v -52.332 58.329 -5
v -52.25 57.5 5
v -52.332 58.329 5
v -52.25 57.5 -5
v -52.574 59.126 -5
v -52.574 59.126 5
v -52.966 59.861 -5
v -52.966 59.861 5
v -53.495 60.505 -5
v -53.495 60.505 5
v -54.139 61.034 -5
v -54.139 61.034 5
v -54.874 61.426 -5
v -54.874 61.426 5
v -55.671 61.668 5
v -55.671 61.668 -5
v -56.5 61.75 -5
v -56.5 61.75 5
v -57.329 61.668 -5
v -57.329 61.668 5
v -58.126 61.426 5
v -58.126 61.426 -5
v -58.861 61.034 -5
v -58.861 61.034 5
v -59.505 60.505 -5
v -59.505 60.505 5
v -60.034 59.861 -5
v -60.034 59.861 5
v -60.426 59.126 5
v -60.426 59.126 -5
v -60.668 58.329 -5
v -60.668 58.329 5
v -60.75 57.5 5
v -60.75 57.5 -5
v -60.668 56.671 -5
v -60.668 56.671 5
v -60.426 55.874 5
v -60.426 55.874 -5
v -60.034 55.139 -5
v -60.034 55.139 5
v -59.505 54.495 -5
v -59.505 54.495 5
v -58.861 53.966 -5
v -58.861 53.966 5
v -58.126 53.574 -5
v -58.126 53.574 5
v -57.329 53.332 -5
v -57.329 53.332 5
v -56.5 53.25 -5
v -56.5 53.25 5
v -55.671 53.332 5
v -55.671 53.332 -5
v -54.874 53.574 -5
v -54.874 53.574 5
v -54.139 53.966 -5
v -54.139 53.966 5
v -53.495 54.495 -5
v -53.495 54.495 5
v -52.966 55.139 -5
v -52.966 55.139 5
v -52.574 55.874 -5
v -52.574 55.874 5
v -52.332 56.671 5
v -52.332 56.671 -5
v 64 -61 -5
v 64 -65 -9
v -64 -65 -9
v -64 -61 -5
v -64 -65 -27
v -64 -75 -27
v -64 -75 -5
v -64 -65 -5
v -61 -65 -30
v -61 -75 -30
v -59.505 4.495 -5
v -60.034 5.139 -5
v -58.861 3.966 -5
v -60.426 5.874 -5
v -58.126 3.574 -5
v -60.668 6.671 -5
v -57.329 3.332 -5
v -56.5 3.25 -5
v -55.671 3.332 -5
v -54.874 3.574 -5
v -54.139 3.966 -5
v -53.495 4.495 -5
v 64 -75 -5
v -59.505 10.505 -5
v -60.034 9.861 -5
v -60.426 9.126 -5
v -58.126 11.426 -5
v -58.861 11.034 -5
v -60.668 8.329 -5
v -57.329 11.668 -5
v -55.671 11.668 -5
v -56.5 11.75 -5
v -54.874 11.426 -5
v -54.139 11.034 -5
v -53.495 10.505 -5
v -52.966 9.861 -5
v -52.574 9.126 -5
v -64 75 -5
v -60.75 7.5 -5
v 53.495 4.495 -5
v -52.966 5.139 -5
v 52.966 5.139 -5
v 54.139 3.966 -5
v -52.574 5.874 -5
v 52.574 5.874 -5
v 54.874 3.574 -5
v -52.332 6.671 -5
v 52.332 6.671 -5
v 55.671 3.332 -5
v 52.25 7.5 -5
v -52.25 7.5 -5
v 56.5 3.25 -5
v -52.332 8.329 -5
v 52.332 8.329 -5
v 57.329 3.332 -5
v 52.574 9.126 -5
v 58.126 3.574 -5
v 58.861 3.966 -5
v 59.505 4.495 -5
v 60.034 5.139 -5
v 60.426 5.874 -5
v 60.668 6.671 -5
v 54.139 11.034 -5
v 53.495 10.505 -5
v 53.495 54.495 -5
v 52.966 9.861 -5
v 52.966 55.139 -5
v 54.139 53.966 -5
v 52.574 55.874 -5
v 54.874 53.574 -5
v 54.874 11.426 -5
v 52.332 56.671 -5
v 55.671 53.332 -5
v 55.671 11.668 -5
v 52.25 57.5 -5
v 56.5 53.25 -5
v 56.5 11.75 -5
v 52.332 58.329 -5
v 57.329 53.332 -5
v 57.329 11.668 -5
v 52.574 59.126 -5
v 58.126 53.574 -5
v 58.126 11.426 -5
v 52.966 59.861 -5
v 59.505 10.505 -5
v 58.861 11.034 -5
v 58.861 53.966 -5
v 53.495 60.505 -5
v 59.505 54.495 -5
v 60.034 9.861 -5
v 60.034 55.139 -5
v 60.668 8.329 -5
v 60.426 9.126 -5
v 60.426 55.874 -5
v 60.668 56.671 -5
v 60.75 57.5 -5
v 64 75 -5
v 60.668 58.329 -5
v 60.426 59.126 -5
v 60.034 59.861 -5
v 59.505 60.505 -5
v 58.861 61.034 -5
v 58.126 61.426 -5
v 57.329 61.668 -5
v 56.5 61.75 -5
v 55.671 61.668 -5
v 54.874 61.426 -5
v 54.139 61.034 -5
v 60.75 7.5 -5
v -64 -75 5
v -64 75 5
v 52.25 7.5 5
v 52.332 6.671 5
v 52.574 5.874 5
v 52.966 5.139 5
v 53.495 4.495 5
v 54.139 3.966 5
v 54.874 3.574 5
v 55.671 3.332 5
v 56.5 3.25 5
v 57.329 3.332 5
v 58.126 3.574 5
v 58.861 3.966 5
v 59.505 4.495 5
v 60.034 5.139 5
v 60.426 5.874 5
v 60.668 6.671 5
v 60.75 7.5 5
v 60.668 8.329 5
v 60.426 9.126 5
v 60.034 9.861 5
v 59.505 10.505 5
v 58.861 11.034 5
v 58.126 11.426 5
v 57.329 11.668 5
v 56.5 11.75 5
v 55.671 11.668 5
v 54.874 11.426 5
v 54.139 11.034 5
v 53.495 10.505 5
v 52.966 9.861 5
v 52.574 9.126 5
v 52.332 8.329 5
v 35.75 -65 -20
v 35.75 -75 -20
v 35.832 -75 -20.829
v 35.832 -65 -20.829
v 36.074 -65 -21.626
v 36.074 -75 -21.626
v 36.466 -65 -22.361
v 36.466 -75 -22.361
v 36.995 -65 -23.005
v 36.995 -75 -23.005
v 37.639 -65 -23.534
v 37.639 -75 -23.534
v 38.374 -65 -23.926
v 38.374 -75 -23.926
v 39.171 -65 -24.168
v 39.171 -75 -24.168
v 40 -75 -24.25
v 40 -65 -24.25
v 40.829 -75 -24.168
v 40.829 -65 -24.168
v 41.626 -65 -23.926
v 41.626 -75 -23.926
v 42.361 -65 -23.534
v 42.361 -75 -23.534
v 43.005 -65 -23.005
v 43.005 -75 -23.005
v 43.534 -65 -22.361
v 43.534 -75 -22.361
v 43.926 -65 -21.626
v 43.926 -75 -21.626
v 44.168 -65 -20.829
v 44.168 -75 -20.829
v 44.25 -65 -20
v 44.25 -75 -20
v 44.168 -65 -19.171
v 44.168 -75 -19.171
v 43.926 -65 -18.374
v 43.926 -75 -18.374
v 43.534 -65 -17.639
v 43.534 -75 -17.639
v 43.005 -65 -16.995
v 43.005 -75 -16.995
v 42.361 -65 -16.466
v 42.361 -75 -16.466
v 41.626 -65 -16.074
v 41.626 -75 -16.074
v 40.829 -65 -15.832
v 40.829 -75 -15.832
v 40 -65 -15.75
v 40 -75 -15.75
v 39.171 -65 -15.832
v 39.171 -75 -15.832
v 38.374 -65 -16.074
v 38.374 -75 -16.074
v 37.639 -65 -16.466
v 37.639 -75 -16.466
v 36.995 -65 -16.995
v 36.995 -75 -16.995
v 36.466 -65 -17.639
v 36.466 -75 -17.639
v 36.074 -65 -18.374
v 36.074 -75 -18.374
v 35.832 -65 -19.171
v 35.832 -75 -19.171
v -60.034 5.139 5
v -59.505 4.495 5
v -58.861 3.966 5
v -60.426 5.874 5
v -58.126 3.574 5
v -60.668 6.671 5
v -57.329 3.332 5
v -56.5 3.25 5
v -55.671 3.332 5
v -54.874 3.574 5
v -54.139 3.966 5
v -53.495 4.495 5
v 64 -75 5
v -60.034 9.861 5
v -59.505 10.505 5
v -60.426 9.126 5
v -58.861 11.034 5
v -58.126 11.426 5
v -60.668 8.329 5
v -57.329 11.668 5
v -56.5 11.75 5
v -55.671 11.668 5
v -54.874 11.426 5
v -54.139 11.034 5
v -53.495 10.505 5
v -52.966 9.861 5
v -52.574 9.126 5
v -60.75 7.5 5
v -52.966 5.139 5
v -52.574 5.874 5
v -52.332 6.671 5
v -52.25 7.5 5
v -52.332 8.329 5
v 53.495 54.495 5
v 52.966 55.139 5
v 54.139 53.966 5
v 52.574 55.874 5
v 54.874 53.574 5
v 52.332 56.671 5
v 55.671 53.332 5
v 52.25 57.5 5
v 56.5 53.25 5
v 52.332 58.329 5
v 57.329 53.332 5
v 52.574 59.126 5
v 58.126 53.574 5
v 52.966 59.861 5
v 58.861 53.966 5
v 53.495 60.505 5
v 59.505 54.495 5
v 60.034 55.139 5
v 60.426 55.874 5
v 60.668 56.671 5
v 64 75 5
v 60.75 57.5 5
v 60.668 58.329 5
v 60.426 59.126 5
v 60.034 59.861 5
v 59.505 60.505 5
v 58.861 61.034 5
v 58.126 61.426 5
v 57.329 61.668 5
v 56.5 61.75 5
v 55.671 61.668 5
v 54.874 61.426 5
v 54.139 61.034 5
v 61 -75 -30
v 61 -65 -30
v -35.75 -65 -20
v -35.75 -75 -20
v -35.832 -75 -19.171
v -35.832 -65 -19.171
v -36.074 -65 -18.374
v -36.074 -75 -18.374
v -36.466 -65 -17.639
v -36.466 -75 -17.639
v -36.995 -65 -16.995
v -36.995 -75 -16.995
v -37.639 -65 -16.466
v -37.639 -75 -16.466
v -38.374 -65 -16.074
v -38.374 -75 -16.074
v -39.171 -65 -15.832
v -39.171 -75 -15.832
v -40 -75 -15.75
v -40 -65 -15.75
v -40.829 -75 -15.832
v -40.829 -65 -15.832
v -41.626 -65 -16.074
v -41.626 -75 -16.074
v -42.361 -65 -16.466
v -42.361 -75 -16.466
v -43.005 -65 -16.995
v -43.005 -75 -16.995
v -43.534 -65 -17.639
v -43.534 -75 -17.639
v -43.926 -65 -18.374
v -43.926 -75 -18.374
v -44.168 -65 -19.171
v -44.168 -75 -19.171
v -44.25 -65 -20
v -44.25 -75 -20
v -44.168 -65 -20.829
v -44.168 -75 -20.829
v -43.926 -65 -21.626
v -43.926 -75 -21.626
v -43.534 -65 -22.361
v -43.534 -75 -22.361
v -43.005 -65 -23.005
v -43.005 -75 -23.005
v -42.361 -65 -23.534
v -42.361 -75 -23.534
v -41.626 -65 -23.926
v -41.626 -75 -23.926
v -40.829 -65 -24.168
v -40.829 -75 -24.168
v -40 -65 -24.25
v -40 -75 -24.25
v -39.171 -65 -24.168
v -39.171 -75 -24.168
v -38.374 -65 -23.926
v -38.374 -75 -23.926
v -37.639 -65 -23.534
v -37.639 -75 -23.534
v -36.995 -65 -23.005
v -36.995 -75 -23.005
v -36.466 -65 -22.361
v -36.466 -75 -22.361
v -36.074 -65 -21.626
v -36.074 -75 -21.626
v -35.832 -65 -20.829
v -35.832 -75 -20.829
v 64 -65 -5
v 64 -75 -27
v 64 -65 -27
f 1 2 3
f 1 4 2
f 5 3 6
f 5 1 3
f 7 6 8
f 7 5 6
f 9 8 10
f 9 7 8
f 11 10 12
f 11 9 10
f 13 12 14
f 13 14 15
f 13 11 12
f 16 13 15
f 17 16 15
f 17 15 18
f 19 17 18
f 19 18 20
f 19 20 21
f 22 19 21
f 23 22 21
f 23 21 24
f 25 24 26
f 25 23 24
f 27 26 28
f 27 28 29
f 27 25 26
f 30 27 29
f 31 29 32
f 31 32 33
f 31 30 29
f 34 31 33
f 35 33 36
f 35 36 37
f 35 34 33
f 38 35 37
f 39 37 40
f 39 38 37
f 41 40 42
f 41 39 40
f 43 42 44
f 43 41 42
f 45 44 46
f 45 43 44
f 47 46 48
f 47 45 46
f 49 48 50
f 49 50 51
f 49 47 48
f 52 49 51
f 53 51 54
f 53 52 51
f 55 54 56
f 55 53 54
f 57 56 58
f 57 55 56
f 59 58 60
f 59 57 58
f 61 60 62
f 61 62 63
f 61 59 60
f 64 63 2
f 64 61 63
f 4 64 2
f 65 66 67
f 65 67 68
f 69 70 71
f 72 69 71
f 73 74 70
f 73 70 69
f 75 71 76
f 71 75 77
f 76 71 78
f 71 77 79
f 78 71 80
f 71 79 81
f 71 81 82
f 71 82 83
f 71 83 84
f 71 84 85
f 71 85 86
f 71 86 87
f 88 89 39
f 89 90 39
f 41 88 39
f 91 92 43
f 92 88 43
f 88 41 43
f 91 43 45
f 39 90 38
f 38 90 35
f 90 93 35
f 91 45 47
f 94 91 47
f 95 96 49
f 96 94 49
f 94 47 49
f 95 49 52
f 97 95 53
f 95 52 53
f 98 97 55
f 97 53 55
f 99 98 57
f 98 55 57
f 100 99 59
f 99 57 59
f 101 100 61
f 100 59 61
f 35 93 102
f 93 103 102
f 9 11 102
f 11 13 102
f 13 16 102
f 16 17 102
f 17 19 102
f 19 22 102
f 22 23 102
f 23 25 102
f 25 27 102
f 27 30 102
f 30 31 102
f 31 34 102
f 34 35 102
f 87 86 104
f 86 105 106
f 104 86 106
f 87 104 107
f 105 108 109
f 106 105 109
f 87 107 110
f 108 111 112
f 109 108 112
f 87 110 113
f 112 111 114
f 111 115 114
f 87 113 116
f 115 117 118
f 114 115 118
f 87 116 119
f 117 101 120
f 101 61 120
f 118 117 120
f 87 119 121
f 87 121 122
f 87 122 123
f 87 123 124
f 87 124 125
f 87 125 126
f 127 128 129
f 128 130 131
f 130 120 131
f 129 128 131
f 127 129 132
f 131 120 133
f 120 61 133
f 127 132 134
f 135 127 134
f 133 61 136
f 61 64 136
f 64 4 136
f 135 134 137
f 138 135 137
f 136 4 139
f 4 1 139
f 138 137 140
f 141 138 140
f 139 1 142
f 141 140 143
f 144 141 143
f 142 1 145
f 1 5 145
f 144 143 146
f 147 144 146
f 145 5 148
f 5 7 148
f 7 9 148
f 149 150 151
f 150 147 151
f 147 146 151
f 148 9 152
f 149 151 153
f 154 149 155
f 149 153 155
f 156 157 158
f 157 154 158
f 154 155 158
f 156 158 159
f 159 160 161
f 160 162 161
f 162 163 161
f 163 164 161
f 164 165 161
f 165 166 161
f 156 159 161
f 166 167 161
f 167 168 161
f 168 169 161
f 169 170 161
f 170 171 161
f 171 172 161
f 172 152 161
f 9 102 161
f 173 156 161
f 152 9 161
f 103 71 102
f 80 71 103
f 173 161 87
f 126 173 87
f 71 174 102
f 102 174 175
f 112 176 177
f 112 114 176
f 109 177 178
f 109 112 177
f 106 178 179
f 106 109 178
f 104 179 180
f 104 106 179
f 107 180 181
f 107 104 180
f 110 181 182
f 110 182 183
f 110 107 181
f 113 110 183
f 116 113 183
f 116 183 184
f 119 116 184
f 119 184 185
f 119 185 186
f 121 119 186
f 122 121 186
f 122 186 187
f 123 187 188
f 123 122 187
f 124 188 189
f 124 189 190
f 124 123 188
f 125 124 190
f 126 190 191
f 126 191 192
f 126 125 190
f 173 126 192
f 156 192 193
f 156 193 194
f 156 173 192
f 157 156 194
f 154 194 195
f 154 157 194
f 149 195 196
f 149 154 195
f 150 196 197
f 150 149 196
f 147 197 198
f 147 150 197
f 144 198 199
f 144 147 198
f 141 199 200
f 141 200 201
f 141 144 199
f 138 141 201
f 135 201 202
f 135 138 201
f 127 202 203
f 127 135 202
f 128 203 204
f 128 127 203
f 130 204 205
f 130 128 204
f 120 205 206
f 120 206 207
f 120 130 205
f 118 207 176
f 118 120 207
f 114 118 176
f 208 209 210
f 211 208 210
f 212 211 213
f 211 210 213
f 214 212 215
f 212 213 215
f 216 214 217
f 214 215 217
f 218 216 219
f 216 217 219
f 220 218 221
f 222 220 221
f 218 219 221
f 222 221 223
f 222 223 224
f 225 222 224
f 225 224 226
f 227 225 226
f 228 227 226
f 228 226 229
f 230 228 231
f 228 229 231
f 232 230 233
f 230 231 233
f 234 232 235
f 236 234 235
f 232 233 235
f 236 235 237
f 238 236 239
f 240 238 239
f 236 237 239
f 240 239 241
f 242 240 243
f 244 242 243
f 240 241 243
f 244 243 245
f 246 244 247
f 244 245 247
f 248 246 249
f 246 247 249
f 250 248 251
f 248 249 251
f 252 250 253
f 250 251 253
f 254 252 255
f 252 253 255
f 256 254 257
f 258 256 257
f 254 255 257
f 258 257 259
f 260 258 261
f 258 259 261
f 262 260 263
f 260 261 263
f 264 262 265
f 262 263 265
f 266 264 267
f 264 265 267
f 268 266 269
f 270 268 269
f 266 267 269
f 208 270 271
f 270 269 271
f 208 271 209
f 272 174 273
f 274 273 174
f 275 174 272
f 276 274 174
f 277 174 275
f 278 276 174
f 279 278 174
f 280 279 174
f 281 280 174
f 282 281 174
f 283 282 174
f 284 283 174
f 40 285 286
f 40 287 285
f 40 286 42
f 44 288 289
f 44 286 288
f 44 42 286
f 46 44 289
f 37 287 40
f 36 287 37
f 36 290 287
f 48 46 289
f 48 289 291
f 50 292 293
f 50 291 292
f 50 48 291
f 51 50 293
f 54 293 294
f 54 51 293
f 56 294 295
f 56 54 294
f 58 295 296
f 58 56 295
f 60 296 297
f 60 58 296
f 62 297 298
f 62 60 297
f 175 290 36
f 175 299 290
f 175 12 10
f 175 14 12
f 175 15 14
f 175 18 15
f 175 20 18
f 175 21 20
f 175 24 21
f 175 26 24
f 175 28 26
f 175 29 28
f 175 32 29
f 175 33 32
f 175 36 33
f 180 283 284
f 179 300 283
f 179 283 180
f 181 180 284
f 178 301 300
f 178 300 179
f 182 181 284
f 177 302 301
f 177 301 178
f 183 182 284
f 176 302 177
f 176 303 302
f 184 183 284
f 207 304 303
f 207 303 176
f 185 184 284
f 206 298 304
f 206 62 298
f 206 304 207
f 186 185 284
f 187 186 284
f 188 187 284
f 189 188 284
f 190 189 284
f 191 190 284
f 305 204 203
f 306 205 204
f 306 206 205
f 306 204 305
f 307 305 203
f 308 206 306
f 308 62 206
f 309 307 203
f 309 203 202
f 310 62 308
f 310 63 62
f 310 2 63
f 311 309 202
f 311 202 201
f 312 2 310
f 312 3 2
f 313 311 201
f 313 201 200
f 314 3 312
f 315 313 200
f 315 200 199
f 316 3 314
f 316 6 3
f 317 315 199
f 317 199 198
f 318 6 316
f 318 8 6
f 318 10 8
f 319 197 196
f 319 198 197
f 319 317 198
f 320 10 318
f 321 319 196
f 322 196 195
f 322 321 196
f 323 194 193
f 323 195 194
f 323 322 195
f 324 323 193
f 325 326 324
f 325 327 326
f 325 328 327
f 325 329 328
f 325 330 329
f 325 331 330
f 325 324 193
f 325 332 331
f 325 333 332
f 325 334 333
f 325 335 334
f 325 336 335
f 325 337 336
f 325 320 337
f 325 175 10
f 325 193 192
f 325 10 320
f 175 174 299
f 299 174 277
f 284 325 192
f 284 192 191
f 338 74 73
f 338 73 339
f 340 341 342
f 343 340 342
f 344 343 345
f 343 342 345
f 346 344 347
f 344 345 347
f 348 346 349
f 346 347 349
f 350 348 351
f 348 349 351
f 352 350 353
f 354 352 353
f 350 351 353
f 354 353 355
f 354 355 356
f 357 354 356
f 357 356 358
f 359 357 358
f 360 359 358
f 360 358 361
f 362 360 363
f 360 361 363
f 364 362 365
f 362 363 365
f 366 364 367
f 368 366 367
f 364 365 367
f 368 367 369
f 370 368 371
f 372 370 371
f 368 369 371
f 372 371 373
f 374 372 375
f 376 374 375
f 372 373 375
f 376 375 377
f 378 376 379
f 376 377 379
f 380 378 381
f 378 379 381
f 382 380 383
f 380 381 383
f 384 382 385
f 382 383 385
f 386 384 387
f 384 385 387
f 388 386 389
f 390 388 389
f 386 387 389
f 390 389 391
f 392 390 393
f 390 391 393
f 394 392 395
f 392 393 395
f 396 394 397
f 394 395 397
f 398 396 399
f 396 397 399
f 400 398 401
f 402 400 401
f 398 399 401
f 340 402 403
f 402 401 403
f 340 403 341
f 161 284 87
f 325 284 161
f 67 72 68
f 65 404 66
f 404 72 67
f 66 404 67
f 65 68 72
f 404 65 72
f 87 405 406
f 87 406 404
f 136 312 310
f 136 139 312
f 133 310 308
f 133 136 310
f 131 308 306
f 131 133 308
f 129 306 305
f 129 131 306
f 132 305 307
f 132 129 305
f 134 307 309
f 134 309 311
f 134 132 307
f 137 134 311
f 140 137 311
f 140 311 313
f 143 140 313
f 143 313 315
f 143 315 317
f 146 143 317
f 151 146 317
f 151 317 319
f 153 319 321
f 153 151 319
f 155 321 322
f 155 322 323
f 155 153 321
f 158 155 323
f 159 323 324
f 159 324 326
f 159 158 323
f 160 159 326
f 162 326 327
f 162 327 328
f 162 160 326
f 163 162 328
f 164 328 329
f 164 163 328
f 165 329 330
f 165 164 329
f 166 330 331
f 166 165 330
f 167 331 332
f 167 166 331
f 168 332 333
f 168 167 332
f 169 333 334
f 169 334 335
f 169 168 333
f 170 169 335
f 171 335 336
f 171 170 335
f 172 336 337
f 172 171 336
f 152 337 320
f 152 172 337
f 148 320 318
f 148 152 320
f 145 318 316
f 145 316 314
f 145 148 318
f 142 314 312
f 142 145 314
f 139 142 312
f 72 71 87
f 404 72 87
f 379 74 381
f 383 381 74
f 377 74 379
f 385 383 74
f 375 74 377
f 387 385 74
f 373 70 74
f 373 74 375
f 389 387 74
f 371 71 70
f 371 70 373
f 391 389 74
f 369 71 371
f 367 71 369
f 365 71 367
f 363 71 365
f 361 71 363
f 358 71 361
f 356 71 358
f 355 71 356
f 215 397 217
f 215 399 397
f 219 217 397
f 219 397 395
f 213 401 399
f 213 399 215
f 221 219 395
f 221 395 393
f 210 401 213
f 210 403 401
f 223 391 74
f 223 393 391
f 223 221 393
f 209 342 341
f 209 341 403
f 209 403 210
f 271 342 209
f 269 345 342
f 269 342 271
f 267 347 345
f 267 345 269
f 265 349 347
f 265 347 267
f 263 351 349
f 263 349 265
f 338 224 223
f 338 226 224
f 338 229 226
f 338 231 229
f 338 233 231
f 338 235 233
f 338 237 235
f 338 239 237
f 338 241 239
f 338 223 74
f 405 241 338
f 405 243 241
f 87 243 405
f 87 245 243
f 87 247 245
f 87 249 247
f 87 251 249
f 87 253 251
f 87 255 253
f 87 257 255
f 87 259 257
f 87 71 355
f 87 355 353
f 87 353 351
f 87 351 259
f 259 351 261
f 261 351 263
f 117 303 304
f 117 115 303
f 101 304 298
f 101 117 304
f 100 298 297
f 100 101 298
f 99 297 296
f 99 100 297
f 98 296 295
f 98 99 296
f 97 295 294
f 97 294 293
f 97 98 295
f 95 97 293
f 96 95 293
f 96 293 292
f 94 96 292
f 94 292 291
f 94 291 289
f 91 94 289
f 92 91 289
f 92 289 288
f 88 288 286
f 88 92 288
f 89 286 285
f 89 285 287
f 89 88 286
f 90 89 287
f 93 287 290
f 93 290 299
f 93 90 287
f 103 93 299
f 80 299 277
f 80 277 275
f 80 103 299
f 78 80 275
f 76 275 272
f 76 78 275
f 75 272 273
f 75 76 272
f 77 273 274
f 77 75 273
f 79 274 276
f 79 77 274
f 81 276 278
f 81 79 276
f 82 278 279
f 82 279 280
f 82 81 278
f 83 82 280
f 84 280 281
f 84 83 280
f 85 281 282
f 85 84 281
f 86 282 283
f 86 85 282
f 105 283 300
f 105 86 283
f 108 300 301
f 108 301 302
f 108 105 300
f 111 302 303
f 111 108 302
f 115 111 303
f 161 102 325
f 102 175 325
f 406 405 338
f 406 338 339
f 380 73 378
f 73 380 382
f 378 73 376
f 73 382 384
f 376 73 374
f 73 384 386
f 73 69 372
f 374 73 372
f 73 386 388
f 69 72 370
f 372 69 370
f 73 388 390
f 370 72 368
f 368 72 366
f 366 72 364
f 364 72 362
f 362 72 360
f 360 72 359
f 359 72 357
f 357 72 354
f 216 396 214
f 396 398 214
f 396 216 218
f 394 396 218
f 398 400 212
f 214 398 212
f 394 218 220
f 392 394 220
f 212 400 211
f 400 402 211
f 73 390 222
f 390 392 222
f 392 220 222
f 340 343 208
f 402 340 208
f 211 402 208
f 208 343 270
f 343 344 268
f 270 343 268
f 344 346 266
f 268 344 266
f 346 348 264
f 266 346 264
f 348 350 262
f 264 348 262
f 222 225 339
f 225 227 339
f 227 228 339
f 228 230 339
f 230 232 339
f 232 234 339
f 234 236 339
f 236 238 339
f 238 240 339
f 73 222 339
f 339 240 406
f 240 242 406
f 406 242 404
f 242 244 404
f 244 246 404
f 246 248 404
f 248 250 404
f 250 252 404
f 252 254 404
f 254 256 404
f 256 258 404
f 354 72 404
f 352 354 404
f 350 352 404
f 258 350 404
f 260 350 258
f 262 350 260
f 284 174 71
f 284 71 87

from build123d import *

# Parameters (mm, degrees)
SKETCH1_W           = 128
SKETCH1_H           = 150
SKETCH1_R           = 4.25
BOSS_EXTRUDE1_DEPTH = 5
SKETCH2_W           = 128
SKETCH2_H           = 25
SKETCH2_R           = 4.25
BOSS_EXTRUDE2_DEPTH = 10
FILLET_START        = -64
FILLET_BEAD1_DEPTH  = 128
CHAMFER1_SIZE       = 3


# Read off the part's stored shape, not the designer's step: Fillet Bead1
with BuildPart() as part:
    # Sketch1 → Boss-Extrude1 (new, symmetric)
    with BuildSketch(Plane.XY):
        Rectangle(SKETCH1_W, SKETCH1_H)
        with Locations((-56.5, 57.5)):
            Circle(SKETCH1_R, mode=Mode.SUBTRACT)
        with Locations((-56.5, 7.5)):
            Circle(SKETCH1_R, mode=Mode.SUBTRACT)
        with Locations(Location((56.5, 7.5, 0), (0, 0, 180))):
            Circle(SKETCH1_R, mode=Mode.SUBTRACT)
        with Locations(Location((56.5, 57.5, 0), (0, 0, 180))):
            Circle(SKETCH1_R, mode=Mode.SUBTRACT)
    extrude(amount=BOSS_EXTRUDE1_DEPTH, both=True)


with BuildPart() as body_2:
    # Sketch2 → Boss-Extrude2 (new body)
    with BuildSketch(Plane.XZ.offset(75)):
        with Locations((0, -17.5)):
            Rectangle(SKETCH2_W, SKETCH2_H)
        with Locations((-40, -20)):
            Circle(SKETCH2_R, mode=Mode.SUBTRACT)
        with Locations(Location((40, -20, 0), (0, 0, 180))):
            Circle(SKETCH2_R, mode=Mode.SUBTRACT)
    extrude(amount=-BOSS_EXTRUDE2_DEPTH)

    # Chamfer1
    chamfer1_edges = [body_2.edges().sort_by_distance(p)[0] for p in [
        (64, -70, -30),
        (-64, -70, -30),
    ]]
    chamfer(chamfer1_edges, length=CHAMFER1_SIZE)


with BuildPart() as body_3:
    # Fillet Bead1 outline → Fillet Bead1 (new body)
    with BuildSketch(Plane.YZ.offset(FILLET_START)):
        Polygon((-65, -9), (-61, -5), (-65, -5), align=None)
    extrude(amount=FILLET_BEAD1_DEPTH)


solid = Compound([part.part, body_2.part, body_3.part])
